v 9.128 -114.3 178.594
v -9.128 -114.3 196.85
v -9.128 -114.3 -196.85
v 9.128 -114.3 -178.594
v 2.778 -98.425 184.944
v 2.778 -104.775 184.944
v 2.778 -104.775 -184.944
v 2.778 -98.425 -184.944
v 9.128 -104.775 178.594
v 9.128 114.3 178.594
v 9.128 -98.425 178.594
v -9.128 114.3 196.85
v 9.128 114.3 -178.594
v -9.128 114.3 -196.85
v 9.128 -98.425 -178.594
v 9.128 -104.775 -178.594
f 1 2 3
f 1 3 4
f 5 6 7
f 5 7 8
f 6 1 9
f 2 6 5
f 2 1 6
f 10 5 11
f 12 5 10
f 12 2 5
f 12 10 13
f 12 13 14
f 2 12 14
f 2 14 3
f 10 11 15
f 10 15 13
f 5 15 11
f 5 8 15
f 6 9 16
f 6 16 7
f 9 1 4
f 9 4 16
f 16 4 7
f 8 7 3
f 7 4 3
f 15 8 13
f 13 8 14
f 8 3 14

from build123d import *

# Parameters (mm, degrees)
F1_DEPTH = 196.85
F2_SIZE2 = 18.25624
F2_SIZE  = 18.25624
F3_SIZE  = 18.25624


# Not quite as in the source:
# - a fillet or chamfer is up to 0.001 mm smaller than in the source, because OpenCascade refuses the exact size


with BuildPart() as f1:
    # F0 (on Top) → F1 (new body, symmetric)
    with BuildSketch(Plane.XY):
        Polygon((9.128125, -98.425), (9.128125, 114.3), (-9.128125, 114.3), (-9.128125, -114.3), (9.128125, -114.3), (9.128125, -104.775), (2.778125, -104.775), (2.778125, -98.425), align=None)
    extrude(amount=F1_DEPTH, both=True)

    # F2 (size 18.25625 and 18.25625 in the source; OpenCascade refuses exactly that, so slightly less here)
    f2_edges = [f1.edges().sort_by_distance(p)[0] for p in [
        (9.128125, 7.9375, 196.85),
    ]]
    chamfer(f2_edges, length=F2_SIZE, length2=F2_SIZE2)

    # F3 (size 18.25625 in the source; OpenCascade refuses exactly that, so slightly less here)
    f3_edges = [f1.edges().sort_by_distance(p)[0] for p in [
        (9.128125, 7.9375, -196.85),
    ]]
    chamfer(f3_edges, length=F3_SIZE)


solid = f1.part
